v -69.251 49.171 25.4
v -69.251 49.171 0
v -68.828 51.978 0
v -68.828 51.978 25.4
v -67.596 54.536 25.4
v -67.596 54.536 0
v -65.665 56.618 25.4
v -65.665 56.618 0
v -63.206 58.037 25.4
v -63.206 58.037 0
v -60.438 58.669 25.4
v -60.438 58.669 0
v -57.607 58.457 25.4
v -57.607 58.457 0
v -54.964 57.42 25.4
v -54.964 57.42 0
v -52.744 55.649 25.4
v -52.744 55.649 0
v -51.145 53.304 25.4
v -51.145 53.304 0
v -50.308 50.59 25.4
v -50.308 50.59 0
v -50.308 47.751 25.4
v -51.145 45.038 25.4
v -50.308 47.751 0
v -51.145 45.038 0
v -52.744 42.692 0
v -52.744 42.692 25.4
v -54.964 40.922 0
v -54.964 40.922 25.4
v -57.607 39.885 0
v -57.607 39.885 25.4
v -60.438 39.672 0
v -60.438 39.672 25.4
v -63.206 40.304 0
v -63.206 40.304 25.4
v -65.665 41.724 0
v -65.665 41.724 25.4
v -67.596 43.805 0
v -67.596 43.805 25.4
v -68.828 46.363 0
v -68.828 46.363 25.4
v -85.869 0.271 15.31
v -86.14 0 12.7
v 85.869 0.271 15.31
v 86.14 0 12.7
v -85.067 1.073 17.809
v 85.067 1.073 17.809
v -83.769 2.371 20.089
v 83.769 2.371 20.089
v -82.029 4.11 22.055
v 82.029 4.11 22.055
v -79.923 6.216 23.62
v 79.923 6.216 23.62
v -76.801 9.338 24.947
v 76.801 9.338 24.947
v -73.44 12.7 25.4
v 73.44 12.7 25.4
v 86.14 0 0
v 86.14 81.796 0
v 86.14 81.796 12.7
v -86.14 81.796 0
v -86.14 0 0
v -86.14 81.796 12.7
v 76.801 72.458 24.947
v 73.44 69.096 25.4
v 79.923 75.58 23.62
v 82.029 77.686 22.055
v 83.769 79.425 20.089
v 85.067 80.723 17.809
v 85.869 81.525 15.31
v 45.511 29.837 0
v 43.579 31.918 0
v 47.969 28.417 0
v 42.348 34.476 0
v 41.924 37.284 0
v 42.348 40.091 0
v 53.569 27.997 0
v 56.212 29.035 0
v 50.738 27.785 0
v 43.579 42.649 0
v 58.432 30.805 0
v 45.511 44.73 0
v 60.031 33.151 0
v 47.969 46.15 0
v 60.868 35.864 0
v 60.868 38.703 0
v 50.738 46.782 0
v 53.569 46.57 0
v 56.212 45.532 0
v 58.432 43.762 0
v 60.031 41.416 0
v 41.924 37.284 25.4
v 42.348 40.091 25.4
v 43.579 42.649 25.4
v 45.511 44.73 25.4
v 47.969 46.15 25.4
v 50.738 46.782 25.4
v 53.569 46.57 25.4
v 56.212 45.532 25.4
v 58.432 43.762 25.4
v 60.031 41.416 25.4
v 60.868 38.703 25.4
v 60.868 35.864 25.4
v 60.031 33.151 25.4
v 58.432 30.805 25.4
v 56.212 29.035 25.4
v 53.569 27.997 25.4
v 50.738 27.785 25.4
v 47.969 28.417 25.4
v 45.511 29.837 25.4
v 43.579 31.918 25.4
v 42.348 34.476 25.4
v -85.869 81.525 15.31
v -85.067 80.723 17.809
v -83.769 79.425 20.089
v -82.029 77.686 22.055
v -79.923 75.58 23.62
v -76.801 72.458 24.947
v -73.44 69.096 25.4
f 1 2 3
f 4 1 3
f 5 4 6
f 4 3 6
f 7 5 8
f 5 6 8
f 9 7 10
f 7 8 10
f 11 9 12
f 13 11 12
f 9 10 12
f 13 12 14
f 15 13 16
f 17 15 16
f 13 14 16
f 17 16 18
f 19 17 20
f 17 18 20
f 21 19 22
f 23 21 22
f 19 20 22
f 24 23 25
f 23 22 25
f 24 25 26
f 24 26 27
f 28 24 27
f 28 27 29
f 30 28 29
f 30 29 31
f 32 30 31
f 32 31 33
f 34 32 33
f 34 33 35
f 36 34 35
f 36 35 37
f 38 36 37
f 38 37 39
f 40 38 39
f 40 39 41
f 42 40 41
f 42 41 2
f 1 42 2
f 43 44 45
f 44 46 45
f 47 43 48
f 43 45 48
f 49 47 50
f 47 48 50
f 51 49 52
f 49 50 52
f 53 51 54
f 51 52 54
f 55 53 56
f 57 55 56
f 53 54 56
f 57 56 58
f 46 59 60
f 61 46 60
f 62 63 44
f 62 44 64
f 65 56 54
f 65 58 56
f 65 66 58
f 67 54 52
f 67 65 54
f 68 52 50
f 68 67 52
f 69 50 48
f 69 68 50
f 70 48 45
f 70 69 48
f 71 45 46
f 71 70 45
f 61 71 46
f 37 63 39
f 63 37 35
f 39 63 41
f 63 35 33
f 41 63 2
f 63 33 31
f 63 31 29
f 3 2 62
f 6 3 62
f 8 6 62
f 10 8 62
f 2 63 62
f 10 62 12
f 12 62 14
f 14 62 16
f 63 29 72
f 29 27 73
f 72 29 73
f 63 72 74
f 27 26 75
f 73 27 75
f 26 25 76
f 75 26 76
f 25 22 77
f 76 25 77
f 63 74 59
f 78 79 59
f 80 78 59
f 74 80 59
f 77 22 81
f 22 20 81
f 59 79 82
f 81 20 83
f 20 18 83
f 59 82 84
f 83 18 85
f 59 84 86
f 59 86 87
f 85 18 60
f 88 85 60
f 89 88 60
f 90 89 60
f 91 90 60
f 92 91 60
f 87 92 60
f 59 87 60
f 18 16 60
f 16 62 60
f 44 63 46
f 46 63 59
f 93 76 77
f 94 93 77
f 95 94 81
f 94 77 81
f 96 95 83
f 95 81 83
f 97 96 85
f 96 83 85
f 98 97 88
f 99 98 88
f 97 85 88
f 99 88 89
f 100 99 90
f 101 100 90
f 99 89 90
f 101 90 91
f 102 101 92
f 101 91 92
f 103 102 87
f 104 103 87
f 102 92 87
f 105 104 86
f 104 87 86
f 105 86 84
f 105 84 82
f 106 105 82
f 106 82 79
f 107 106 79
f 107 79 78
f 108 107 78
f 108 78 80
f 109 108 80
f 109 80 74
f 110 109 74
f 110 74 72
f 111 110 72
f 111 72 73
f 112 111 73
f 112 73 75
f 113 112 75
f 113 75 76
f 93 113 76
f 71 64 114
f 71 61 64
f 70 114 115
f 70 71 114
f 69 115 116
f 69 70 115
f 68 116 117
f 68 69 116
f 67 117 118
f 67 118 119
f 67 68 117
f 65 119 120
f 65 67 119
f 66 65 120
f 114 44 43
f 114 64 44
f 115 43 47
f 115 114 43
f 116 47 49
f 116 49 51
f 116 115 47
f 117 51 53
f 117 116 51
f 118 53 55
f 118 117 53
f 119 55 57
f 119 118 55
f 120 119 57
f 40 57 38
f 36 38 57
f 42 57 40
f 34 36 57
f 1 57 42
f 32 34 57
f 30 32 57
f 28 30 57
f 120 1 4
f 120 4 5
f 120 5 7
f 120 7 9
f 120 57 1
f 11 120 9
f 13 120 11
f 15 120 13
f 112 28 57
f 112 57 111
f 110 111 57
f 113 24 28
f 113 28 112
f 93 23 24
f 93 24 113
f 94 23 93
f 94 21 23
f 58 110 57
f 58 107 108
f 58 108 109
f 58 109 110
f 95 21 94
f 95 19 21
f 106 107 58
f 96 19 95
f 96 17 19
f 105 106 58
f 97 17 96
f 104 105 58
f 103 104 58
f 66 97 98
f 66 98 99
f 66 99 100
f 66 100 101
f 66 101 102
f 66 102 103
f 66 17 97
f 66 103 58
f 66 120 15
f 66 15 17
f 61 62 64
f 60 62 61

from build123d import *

# Parameters (mm, degrees)
F0_W     = 172.279298
F0_H     = 81.796013
F1_DEPTH = 25.4
F3_D     = 19.05
F4_R     = 12.7


with BuildPart() as f1:
    # F0 (on Top) → F1 (new body)
    with BuildSketch(Plane.XY):
        with Locations((0, 40.898007)):
            Rectangle(F0_W, F0_H)
    extrude(amount=F1_DEPTH)

    # F3 (through all)
    with Locations(Plane.XY.offset(25.4)):
        with Locations((51.449351, 37.283532), (-59.726231, 49.170807)):
            Hole(F3_D / 2)

    # F4
    f4_edges = [f1.edges().sort_by_distance(p)[0] for p in [
        (0, 81.796013, 25.4),
        (-86.139649, 40.898006, 25.4),
        (0, 0, 25.4),
        (86.139649, 40.898006, 25.4),
    ]]
    fillet(f4_edges, radius=F4_R)


solid = f1.part
